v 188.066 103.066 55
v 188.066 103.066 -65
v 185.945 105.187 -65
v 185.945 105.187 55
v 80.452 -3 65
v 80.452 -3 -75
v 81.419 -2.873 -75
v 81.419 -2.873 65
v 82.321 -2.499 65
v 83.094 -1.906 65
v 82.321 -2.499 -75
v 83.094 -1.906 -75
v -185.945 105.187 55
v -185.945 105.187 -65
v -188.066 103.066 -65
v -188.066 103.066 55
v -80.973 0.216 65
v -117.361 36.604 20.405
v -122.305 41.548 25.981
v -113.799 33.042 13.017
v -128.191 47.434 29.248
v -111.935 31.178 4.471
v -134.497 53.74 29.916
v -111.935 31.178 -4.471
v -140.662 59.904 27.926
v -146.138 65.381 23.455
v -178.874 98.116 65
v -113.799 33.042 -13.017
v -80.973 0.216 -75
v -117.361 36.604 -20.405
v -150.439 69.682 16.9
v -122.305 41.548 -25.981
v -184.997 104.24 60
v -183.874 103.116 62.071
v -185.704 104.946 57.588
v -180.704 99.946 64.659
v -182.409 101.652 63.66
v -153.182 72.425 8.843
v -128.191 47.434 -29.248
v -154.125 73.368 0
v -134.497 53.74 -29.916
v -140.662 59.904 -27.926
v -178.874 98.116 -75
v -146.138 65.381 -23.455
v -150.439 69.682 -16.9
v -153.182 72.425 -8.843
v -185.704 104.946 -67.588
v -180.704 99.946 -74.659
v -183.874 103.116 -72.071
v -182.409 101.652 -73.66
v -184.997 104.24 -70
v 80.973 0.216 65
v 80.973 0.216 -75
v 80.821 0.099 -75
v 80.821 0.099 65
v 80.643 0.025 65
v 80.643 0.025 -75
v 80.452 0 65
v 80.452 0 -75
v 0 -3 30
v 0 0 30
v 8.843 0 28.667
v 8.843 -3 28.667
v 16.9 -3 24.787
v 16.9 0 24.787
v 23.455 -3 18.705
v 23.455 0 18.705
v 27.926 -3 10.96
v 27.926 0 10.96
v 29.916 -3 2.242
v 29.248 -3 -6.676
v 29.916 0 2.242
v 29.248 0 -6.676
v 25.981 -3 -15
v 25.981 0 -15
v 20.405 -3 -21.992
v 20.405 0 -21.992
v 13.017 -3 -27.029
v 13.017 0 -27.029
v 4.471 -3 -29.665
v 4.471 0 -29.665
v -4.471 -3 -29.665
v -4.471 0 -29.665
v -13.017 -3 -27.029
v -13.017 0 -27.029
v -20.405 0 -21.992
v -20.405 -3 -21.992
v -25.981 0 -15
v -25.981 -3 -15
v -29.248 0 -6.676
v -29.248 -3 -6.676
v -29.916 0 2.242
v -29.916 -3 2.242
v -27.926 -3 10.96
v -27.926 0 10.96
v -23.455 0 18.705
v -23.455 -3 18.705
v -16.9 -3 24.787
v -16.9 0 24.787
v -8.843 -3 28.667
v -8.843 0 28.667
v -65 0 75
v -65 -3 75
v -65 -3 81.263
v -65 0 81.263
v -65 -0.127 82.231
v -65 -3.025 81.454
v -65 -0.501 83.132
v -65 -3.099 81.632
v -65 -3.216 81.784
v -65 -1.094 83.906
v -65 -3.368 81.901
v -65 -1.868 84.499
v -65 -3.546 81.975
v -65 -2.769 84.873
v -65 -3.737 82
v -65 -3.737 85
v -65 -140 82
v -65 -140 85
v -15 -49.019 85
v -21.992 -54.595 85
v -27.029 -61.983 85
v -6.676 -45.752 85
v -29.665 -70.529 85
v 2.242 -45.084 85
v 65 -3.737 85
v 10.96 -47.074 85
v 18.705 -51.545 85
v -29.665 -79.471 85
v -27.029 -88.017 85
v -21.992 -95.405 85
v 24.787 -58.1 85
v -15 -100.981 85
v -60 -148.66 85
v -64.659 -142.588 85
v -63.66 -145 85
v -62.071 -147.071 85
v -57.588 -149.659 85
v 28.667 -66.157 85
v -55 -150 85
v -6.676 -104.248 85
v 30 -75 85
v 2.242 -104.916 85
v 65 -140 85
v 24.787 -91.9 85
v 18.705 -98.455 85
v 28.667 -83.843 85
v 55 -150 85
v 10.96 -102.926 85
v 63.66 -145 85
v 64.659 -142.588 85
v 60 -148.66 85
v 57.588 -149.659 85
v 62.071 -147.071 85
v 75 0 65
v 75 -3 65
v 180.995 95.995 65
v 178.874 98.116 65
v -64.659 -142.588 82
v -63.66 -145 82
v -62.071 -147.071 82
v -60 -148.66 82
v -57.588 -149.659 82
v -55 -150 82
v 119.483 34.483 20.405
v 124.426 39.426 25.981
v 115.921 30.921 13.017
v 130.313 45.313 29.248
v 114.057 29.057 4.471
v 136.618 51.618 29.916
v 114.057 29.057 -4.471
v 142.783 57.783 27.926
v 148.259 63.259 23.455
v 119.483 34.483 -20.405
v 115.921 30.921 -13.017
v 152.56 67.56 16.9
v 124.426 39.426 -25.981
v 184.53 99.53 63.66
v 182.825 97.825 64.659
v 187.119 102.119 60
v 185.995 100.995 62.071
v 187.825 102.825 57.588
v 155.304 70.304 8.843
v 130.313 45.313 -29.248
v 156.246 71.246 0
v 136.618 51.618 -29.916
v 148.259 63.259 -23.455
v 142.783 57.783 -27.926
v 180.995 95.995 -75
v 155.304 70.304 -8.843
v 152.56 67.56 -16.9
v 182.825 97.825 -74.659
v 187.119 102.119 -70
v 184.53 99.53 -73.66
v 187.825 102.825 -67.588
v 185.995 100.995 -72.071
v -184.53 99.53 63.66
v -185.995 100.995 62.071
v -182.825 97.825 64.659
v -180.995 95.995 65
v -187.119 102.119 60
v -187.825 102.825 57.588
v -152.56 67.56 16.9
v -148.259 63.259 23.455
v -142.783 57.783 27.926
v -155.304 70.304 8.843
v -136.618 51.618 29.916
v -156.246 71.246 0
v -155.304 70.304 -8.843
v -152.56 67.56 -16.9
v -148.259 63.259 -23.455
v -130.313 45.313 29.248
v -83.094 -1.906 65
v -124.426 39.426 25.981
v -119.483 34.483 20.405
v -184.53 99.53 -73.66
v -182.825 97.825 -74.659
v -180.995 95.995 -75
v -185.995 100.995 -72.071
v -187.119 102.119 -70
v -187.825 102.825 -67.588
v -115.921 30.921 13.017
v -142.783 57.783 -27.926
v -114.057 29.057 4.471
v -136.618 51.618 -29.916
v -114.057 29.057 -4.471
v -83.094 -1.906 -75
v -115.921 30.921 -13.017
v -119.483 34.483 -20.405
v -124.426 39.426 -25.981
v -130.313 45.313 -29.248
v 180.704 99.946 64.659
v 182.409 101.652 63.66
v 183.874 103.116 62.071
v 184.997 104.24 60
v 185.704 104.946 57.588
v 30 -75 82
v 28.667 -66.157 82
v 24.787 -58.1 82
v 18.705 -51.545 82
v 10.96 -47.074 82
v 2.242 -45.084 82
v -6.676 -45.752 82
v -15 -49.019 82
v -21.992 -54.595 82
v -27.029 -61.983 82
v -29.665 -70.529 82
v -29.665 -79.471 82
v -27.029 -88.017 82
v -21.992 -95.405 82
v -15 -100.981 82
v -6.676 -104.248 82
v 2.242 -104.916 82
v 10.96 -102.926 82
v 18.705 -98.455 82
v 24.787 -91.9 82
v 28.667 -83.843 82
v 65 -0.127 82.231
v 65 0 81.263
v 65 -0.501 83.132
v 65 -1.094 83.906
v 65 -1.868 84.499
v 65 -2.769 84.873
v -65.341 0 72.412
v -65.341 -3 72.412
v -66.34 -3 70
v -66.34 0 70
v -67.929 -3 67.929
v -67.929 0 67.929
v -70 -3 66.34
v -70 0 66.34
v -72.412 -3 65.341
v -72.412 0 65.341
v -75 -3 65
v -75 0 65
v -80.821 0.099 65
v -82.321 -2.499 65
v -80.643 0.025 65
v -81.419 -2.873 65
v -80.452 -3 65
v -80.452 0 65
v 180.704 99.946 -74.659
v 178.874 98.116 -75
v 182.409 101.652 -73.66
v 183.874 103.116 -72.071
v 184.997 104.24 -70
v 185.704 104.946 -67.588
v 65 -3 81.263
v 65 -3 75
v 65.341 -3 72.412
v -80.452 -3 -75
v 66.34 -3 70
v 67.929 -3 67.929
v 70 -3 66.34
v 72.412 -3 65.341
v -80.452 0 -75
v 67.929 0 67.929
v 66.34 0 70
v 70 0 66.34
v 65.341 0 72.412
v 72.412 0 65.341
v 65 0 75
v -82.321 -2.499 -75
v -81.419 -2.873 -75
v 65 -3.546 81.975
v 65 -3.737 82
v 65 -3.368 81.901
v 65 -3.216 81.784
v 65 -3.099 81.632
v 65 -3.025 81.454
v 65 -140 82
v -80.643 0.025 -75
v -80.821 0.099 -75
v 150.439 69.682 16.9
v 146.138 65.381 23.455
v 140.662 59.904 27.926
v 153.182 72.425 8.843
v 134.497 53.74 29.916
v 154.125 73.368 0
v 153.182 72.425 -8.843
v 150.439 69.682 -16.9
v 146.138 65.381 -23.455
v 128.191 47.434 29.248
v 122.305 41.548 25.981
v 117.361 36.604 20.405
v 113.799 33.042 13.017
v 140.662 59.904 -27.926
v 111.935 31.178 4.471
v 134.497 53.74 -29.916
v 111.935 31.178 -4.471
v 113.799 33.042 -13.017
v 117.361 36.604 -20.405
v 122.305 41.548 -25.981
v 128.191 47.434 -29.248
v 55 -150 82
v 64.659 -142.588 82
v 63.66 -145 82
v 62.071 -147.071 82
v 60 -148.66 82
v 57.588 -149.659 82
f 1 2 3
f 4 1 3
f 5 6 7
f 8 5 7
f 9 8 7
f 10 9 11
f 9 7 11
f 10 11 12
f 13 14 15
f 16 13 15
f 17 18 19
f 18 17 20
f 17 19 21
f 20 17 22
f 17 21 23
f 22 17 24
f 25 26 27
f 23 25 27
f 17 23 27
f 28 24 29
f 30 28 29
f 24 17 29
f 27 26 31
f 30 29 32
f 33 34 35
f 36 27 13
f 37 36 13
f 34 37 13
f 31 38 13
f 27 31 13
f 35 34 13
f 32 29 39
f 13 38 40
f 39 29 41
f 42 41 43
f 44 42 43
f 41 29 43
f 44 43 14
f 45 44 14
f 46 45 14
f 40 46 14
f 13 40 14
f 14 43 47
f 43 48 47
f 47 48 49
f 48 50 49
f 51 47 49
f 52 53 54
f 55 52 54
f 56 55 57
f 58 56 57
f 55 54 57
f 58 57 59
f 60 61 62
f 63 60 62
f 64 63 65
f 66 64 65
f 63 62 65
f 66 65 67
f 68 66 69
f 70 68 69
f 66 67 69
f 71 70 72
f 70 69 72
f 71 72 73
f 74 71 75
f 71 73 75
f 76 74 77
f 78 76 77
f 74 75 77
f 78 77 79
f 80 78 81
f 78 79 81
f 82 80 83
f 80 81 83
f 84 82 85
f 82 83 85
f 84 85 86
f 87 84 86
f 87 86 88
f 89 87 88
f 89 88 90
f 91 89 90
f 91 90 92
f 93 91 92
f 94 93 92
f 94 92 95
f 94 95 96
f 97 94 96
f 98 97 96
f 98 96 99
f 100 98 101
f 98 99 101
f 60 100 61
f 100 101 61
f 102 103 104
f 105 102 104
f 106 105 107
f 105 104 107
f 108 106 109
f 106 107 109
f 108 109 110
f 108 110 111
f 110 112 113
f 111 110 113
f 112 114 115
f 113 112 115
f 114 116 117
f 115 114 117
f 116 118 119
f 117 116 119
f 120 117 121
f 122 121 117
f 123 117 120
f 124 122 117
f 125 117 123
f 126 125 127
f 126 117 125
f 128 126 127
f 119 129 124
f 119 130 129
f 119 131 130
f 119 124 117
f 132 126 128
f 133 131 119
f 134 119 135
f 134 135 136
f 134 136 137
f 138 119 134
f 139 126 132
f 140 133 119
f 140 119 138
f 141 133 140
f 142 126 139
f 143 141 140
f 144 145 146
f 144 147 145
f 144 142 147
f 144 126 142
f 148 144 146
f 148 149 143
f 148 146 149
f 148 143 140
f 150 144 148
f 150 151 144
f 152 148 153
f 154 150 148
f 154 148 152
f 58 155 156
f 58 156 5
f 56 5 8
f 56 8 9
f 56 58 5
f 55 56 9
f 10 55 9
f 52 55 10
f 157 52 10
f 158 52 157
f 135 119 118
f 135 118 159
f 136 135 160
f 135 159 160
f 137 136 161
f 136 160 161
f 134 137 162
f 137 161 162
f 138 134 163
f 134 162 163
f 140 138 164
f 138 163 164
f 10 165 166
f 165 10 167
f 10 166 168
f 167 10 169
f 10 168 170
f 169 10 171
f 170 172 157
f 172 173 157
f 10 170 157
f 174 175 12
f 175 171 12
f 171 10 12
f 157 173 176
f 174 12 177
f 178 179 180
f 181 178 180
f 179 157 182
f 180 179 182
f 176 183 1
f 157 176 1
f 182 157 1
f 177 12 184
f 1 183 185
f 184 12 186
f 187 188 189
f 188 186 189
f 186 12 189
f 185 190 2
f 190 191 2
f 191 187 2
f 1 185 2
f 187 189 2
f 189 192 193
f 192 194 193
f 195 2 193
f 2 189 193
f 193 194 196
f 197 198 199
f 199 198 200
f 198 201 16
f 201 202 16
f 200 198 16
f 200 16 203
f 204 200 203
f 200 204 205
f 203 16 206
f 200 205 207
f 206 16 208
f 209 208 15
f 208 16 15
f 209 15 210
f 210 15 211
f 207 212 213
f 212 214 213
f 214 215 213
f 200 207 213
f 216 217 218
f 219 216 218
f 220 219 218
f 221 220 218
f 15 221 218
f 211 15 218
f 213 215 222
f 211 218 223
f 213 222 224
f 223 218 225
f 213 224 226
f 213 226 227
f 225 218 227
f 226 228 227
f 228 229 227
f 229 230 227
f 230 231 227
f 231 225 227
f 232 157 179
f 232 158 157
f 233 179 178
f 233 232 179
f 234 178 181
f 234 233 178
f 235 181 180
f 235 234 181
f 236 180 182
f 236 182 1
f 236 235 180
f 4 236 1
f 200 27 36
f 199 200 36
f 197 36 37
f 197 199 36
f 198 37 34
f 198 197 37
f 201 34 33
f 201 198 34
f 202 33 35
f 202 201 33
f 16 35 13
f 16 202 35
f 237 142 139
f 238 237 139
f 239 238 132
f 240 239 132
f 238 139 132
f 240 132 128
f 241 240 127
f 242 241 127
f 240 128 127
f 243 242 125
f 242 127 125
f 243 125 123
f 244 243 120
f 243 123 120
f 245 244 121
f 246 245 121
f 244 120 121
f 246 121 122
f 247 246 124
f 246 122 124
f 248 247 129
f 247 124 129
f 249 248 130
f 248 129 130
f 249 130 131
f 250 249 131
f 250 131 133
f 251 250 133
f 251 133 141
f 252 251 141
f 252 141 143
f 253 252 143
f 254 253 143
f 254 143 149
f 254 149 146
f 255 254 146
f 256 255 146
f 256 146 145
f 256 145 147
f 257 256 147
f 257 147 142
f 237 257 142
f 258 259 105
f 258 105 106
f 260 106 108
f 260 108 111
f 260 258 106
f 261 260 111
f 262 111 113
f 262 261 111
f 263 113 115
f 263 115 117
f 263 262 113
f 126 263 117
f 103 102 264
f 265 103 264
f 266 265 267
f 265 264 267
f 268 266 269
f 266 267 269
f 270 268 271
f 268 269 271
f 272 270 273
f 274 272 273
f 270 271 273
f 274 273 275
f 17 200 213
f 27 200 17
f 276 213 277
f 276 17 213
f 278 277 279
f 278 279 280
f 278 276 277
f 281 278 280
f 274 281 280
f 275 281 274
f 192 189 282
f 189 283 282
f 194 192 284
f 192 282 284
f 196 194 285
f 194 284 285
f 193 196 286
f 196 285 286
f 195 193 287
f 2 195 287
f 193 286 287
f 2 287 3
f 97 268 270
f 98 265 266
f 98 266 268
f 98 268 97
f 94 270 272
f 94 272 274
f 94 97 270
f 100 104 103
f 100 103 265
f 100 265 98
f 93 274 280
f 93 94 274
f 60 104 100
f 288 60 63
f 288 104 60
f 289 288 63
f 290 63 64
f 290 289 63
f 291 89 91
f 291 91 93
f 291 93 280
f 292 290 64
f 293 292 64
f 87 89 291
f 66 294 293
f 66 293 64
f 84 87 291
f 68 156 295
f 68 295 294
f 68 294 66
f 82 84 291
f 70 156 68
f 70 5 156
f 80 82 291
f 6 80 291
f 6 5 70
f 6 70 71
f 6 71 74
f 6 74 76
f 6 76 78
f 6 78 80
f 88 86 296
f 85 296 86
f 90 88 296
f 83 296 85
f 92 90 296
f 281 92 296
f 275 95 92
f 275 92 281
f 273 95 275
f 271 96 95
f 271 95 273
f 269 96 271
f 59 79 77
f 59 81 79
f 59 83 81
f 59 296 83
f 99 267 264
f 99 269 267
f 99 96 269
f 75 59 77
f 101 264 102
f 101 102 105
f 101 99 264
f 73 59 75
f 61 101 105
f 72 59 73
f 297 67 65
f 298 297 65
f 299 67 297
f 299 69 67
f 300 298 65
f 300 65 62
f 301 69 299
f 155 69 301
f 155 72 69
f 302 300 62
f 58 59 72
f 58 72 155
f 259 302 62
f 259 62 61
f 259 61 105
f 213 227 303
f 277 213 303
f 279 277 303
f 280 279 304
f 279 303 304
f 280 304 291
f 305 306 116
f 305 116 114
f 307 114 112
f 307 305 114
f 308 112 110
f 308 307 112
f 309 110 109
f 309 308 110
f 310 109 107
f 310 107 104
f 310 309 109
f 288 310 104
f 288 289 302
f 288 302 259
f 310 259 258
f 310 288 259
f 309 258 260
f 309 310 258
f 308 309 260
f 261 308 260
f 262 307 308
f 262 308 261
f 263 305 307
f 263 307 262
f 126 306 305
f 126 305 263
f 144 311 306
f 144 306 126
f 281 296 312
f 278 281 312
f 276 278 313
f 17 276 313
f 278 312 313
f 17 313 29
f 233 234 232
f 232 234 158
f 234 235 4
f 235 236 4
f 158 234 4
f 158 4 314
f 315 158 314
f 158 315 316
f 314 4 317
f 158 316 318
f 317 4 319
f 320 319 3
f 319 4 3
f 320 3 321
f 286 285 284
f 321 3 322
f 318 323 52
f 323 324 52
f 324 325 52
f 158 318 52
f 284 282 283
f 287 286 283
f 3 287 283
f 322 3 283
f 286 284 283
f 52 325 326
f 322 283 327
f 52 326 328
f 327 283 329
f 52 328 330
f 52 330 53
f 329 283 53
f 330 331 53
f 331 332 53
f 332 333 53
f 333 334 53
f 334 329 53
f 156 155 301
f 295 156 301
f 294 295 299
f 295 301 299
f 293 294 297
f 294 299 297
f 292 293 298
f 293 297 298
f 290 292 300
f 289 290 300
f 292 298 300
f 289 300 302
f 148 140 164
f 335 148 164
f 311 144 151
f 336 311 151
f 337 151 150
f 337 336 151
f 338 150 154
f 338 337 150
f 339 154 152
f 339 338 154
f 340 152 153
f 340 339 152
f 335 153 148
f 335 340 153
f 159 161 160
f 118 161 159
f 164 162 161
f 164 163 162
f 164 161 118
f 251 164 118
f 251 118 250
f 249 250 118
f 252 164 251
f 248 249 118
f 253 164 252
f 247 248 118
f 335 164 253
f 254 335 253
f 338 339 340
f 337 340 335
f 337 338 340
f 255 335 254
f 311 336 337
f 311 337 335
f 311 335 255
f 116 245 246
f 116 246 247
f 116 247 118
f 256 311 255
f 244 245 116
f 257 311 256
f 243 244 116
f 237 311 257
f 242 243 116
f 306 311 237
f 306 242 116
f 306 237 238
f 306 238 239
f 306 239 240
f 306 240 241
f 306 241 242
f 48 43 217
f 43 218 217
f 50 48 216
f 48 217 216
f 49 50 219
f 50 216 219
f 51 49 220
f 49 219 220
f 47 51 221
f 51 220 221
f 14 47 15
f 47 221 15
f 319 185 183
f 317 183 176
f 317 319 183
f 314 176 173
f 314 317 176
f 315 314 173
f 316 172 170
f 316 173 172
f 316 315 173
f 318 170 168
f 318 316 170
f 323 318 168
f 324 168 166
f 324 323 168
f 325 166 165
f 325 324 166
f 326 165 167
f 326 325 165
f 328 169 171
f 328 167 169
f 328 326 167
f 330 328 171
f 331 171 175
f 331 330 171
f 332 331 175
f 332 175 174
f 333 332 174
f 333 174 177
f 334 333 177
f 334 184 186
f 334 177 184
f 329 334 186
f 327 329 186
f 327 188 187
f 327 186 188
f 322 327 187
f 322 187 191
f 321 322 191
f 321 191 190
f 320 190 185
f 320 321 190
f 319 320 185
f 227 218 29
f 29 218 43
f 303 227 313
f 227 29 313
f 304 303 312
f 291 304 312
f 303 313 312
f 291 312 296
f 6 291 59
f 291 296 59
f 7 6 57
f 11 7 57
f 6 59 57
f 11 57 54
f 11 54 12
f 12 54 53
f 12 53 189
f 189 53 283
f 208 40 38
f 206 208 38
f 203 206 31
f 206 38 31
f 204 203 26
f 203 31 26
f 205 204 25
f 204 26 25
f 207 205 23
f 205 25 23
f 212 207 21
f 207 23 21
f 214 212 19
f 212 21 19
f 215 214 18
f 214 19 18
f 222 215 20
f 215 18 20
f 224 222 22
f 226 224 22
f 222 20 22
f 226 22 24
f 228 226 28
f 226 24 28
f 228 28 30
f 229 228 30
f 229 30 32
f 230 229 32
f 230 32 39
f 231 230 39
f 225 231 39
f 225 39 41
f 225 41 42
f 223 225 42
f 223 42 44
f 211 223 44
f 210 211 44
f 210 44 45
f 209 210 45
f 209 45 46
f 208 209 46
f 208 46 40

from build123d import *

# Parameters (mm, degrees)
SKETCH1_R          = 30
BASE_FLANGE1_DEPTH = 3
EDGE_FLANGE1_START = -75
EDGE_FLANGE1_DEPTH = 140
EDGE_FLANGE2_START = -75
EDGE_FLANGE2_DEPTH = 140
EDGE_FLANGE3_DEPTH = 130
SKETCH23_R         = 30
CUT_EXTRUDE1_DEPTH = 10
SKETCH24_R         = 30
CUT_EXTRUDE2_DEPTH = 10
FILLET1_R          = 10


# Read off the part's stored shape, not the designer's step: Edge-Flange1, Edge-Flange2
# Sheet-metal steps are written as plain solids
with BuildPart() as part:
    # Sketch1 → Base-Flange1 (new body)
    with BuildSketch(Plane(origin=(0, 0, 0), x_dir=(1, 0, 0), z_dir=(0, 1, 0))):
        with BuildLine():
            Line((65, -75), (-65, -75))
            ThreePointArc((-65, -75), (-67.928932188, -67.928932188), (-75, -65))
            Line((-75, -65), (-75, 75))
            Line((-75, 75), (75, 75))
            Line((75, 75), (75, -65))
            ThreePointArc((75, -65), (67.928932188, -67.928932188), (65, -75))
        make_face()
        with Locations(Location((0, 0, 0), (0, 0, 270))):
            Circle(SKETCH1_R, mode=Mode.SUBTRACT)
    extrude(amount=-BASE_FLANGE1_DEPTH)

    # Edge-Flange1 outline → Edge-Flange1 (add)
    with BuildSketch(Plane.XY.offset(EDGE_FLANGE1_START)):
        with BuildLine():
            Line((-188.066017178, 103.066017178), (-83.094424801, -1.905575199))
            ThreePointArc((-83.094424801, -1.905575199), (-81.882184516, -2.715568261), (-80.452249603, -3))
            Line((-80.452249603, -3), (-75, -3))
            Line((-75, -3), (-75, 0))
            Line((-75, 0), (-80.452249603, 0))
            ThreePointArc((-80.452249603, 0), (-80.734134219, 0.056070336), (-80.973104458, 0.215745145))
            Line((-80.973104458, 0.215745145), (-185.944696834, 105.187337522))
            Line((-185.944696834, 105.187337522), (-188.066017178, 103.066017178))
        make_face()
    extrude(amount=EDGE_FLANGE1_DEPTH)

    # Edge-Flange2 outline → Edge-Flange2 (add)
    with BuildSketch(Plane.XY.offset(EDGE_FLANGE2_START)):
        with BuildLine():
            ThreePointArc((80.452249603, -3), (81.882184516, -2.715568261), (83.094424801, -1.905575199))
            Line((83.094424801, -1.905575199), (188.066017178, 103.066017178))
            Line((188.066017178, 103.066017178), (185.944696834, 105.187337522))
            Line((185.944696834, 105.187337522), (80.973104458, 0.215745145))
            ThreePointArc((80.973104458, 0.215745145), (80.734134219, 0.056070336), (80.452249603, 0))
            Line((80.452249603, 0), (75, 0))
            Line((75, 0), (75, -3))
            Line((75, -3), (80.452249603, -3))
        make_face()
    extrude(amount=EDGE_FLANGE2_DEPTH)

    # Edge-Flange3 section (across the edge) → Edge-Flange3 (add)
    with BuildSketch(Plane(origin=(65, -3, 85), x_dir=(0, 0, -1), z_dir=(-1, 0, 0))):
        with BuildLine():
            Line((0, 0.7366), (0, 147))
            Line((0, 147), (3, 147))
            Line((3, 147), (3, 0.7366))
            ThreePointArc((3, 0.7366), (3.215745145, 0.215745145), (3.7366, 0))
            Line((3.7366, 0), (10, 0))
            Line((10, 0), (10, -3))
            Line((10, -3), (3.7366, -3))
            ThreePointArc((3.7366, -3), (1.094424801, -1.905575199), (0, 0.7366))
        make_face()
    extrude(amount=EDGE_FLANGE3_DEPTH)

    # Sketch23 → Cut-Extrude1 (cut)
    with BuildSketch(Plane(origin=(-40.378679656, -40.378679656, 0), x_dir=(0, 0, -1), z_dir=(0.7071067811865438, 0.7071067811865513, 0))):
        with Locations(Location((0, 130.861435714, 0), (0, 0, 90))):
            Circle(SKETCH23_R)
    cut_extrude1 = extrude(amount=-CUT_EXTRUDE1_DEPTH, mode=Mode.SUBTRACT)

    # Mirror1: Cut-Extrude1 across plane
    add(cut_extrude1.mirror(Plane(origin=(0, 0, 0), x_dir=(0, 0, 1), z_dir=(1, 0, 0))), mode=Mode.SUBTRACT)

    # Sketch24 → Cut-Extrude2 (cut)
    with BuildSketch(Plane.XY.offset(85)):
        with Locations((0, -75)):
            Circle(SKETCH24_R)
    extrude(amount=-CUT_EXTRUDE2_DEPTH, mode=Mode.SUBTRACT)

    # Fillet1
    fillet1_edges = [part.edges().sort_by_distance(p)[0] for p in [
        (-187.005357006, 104.12667735, -75),
        (-187.005357006, 104.12667735, 65),
        (187.005357006, 104.12667735, 65),
        (187.005357006, 104.12667735, -75),
        (65, -150, 83.5),
        (-65, -150, 83.5),
    ]]
    fillet(fillet1_edges, radius=FILLET1_R)


solid = part.part
